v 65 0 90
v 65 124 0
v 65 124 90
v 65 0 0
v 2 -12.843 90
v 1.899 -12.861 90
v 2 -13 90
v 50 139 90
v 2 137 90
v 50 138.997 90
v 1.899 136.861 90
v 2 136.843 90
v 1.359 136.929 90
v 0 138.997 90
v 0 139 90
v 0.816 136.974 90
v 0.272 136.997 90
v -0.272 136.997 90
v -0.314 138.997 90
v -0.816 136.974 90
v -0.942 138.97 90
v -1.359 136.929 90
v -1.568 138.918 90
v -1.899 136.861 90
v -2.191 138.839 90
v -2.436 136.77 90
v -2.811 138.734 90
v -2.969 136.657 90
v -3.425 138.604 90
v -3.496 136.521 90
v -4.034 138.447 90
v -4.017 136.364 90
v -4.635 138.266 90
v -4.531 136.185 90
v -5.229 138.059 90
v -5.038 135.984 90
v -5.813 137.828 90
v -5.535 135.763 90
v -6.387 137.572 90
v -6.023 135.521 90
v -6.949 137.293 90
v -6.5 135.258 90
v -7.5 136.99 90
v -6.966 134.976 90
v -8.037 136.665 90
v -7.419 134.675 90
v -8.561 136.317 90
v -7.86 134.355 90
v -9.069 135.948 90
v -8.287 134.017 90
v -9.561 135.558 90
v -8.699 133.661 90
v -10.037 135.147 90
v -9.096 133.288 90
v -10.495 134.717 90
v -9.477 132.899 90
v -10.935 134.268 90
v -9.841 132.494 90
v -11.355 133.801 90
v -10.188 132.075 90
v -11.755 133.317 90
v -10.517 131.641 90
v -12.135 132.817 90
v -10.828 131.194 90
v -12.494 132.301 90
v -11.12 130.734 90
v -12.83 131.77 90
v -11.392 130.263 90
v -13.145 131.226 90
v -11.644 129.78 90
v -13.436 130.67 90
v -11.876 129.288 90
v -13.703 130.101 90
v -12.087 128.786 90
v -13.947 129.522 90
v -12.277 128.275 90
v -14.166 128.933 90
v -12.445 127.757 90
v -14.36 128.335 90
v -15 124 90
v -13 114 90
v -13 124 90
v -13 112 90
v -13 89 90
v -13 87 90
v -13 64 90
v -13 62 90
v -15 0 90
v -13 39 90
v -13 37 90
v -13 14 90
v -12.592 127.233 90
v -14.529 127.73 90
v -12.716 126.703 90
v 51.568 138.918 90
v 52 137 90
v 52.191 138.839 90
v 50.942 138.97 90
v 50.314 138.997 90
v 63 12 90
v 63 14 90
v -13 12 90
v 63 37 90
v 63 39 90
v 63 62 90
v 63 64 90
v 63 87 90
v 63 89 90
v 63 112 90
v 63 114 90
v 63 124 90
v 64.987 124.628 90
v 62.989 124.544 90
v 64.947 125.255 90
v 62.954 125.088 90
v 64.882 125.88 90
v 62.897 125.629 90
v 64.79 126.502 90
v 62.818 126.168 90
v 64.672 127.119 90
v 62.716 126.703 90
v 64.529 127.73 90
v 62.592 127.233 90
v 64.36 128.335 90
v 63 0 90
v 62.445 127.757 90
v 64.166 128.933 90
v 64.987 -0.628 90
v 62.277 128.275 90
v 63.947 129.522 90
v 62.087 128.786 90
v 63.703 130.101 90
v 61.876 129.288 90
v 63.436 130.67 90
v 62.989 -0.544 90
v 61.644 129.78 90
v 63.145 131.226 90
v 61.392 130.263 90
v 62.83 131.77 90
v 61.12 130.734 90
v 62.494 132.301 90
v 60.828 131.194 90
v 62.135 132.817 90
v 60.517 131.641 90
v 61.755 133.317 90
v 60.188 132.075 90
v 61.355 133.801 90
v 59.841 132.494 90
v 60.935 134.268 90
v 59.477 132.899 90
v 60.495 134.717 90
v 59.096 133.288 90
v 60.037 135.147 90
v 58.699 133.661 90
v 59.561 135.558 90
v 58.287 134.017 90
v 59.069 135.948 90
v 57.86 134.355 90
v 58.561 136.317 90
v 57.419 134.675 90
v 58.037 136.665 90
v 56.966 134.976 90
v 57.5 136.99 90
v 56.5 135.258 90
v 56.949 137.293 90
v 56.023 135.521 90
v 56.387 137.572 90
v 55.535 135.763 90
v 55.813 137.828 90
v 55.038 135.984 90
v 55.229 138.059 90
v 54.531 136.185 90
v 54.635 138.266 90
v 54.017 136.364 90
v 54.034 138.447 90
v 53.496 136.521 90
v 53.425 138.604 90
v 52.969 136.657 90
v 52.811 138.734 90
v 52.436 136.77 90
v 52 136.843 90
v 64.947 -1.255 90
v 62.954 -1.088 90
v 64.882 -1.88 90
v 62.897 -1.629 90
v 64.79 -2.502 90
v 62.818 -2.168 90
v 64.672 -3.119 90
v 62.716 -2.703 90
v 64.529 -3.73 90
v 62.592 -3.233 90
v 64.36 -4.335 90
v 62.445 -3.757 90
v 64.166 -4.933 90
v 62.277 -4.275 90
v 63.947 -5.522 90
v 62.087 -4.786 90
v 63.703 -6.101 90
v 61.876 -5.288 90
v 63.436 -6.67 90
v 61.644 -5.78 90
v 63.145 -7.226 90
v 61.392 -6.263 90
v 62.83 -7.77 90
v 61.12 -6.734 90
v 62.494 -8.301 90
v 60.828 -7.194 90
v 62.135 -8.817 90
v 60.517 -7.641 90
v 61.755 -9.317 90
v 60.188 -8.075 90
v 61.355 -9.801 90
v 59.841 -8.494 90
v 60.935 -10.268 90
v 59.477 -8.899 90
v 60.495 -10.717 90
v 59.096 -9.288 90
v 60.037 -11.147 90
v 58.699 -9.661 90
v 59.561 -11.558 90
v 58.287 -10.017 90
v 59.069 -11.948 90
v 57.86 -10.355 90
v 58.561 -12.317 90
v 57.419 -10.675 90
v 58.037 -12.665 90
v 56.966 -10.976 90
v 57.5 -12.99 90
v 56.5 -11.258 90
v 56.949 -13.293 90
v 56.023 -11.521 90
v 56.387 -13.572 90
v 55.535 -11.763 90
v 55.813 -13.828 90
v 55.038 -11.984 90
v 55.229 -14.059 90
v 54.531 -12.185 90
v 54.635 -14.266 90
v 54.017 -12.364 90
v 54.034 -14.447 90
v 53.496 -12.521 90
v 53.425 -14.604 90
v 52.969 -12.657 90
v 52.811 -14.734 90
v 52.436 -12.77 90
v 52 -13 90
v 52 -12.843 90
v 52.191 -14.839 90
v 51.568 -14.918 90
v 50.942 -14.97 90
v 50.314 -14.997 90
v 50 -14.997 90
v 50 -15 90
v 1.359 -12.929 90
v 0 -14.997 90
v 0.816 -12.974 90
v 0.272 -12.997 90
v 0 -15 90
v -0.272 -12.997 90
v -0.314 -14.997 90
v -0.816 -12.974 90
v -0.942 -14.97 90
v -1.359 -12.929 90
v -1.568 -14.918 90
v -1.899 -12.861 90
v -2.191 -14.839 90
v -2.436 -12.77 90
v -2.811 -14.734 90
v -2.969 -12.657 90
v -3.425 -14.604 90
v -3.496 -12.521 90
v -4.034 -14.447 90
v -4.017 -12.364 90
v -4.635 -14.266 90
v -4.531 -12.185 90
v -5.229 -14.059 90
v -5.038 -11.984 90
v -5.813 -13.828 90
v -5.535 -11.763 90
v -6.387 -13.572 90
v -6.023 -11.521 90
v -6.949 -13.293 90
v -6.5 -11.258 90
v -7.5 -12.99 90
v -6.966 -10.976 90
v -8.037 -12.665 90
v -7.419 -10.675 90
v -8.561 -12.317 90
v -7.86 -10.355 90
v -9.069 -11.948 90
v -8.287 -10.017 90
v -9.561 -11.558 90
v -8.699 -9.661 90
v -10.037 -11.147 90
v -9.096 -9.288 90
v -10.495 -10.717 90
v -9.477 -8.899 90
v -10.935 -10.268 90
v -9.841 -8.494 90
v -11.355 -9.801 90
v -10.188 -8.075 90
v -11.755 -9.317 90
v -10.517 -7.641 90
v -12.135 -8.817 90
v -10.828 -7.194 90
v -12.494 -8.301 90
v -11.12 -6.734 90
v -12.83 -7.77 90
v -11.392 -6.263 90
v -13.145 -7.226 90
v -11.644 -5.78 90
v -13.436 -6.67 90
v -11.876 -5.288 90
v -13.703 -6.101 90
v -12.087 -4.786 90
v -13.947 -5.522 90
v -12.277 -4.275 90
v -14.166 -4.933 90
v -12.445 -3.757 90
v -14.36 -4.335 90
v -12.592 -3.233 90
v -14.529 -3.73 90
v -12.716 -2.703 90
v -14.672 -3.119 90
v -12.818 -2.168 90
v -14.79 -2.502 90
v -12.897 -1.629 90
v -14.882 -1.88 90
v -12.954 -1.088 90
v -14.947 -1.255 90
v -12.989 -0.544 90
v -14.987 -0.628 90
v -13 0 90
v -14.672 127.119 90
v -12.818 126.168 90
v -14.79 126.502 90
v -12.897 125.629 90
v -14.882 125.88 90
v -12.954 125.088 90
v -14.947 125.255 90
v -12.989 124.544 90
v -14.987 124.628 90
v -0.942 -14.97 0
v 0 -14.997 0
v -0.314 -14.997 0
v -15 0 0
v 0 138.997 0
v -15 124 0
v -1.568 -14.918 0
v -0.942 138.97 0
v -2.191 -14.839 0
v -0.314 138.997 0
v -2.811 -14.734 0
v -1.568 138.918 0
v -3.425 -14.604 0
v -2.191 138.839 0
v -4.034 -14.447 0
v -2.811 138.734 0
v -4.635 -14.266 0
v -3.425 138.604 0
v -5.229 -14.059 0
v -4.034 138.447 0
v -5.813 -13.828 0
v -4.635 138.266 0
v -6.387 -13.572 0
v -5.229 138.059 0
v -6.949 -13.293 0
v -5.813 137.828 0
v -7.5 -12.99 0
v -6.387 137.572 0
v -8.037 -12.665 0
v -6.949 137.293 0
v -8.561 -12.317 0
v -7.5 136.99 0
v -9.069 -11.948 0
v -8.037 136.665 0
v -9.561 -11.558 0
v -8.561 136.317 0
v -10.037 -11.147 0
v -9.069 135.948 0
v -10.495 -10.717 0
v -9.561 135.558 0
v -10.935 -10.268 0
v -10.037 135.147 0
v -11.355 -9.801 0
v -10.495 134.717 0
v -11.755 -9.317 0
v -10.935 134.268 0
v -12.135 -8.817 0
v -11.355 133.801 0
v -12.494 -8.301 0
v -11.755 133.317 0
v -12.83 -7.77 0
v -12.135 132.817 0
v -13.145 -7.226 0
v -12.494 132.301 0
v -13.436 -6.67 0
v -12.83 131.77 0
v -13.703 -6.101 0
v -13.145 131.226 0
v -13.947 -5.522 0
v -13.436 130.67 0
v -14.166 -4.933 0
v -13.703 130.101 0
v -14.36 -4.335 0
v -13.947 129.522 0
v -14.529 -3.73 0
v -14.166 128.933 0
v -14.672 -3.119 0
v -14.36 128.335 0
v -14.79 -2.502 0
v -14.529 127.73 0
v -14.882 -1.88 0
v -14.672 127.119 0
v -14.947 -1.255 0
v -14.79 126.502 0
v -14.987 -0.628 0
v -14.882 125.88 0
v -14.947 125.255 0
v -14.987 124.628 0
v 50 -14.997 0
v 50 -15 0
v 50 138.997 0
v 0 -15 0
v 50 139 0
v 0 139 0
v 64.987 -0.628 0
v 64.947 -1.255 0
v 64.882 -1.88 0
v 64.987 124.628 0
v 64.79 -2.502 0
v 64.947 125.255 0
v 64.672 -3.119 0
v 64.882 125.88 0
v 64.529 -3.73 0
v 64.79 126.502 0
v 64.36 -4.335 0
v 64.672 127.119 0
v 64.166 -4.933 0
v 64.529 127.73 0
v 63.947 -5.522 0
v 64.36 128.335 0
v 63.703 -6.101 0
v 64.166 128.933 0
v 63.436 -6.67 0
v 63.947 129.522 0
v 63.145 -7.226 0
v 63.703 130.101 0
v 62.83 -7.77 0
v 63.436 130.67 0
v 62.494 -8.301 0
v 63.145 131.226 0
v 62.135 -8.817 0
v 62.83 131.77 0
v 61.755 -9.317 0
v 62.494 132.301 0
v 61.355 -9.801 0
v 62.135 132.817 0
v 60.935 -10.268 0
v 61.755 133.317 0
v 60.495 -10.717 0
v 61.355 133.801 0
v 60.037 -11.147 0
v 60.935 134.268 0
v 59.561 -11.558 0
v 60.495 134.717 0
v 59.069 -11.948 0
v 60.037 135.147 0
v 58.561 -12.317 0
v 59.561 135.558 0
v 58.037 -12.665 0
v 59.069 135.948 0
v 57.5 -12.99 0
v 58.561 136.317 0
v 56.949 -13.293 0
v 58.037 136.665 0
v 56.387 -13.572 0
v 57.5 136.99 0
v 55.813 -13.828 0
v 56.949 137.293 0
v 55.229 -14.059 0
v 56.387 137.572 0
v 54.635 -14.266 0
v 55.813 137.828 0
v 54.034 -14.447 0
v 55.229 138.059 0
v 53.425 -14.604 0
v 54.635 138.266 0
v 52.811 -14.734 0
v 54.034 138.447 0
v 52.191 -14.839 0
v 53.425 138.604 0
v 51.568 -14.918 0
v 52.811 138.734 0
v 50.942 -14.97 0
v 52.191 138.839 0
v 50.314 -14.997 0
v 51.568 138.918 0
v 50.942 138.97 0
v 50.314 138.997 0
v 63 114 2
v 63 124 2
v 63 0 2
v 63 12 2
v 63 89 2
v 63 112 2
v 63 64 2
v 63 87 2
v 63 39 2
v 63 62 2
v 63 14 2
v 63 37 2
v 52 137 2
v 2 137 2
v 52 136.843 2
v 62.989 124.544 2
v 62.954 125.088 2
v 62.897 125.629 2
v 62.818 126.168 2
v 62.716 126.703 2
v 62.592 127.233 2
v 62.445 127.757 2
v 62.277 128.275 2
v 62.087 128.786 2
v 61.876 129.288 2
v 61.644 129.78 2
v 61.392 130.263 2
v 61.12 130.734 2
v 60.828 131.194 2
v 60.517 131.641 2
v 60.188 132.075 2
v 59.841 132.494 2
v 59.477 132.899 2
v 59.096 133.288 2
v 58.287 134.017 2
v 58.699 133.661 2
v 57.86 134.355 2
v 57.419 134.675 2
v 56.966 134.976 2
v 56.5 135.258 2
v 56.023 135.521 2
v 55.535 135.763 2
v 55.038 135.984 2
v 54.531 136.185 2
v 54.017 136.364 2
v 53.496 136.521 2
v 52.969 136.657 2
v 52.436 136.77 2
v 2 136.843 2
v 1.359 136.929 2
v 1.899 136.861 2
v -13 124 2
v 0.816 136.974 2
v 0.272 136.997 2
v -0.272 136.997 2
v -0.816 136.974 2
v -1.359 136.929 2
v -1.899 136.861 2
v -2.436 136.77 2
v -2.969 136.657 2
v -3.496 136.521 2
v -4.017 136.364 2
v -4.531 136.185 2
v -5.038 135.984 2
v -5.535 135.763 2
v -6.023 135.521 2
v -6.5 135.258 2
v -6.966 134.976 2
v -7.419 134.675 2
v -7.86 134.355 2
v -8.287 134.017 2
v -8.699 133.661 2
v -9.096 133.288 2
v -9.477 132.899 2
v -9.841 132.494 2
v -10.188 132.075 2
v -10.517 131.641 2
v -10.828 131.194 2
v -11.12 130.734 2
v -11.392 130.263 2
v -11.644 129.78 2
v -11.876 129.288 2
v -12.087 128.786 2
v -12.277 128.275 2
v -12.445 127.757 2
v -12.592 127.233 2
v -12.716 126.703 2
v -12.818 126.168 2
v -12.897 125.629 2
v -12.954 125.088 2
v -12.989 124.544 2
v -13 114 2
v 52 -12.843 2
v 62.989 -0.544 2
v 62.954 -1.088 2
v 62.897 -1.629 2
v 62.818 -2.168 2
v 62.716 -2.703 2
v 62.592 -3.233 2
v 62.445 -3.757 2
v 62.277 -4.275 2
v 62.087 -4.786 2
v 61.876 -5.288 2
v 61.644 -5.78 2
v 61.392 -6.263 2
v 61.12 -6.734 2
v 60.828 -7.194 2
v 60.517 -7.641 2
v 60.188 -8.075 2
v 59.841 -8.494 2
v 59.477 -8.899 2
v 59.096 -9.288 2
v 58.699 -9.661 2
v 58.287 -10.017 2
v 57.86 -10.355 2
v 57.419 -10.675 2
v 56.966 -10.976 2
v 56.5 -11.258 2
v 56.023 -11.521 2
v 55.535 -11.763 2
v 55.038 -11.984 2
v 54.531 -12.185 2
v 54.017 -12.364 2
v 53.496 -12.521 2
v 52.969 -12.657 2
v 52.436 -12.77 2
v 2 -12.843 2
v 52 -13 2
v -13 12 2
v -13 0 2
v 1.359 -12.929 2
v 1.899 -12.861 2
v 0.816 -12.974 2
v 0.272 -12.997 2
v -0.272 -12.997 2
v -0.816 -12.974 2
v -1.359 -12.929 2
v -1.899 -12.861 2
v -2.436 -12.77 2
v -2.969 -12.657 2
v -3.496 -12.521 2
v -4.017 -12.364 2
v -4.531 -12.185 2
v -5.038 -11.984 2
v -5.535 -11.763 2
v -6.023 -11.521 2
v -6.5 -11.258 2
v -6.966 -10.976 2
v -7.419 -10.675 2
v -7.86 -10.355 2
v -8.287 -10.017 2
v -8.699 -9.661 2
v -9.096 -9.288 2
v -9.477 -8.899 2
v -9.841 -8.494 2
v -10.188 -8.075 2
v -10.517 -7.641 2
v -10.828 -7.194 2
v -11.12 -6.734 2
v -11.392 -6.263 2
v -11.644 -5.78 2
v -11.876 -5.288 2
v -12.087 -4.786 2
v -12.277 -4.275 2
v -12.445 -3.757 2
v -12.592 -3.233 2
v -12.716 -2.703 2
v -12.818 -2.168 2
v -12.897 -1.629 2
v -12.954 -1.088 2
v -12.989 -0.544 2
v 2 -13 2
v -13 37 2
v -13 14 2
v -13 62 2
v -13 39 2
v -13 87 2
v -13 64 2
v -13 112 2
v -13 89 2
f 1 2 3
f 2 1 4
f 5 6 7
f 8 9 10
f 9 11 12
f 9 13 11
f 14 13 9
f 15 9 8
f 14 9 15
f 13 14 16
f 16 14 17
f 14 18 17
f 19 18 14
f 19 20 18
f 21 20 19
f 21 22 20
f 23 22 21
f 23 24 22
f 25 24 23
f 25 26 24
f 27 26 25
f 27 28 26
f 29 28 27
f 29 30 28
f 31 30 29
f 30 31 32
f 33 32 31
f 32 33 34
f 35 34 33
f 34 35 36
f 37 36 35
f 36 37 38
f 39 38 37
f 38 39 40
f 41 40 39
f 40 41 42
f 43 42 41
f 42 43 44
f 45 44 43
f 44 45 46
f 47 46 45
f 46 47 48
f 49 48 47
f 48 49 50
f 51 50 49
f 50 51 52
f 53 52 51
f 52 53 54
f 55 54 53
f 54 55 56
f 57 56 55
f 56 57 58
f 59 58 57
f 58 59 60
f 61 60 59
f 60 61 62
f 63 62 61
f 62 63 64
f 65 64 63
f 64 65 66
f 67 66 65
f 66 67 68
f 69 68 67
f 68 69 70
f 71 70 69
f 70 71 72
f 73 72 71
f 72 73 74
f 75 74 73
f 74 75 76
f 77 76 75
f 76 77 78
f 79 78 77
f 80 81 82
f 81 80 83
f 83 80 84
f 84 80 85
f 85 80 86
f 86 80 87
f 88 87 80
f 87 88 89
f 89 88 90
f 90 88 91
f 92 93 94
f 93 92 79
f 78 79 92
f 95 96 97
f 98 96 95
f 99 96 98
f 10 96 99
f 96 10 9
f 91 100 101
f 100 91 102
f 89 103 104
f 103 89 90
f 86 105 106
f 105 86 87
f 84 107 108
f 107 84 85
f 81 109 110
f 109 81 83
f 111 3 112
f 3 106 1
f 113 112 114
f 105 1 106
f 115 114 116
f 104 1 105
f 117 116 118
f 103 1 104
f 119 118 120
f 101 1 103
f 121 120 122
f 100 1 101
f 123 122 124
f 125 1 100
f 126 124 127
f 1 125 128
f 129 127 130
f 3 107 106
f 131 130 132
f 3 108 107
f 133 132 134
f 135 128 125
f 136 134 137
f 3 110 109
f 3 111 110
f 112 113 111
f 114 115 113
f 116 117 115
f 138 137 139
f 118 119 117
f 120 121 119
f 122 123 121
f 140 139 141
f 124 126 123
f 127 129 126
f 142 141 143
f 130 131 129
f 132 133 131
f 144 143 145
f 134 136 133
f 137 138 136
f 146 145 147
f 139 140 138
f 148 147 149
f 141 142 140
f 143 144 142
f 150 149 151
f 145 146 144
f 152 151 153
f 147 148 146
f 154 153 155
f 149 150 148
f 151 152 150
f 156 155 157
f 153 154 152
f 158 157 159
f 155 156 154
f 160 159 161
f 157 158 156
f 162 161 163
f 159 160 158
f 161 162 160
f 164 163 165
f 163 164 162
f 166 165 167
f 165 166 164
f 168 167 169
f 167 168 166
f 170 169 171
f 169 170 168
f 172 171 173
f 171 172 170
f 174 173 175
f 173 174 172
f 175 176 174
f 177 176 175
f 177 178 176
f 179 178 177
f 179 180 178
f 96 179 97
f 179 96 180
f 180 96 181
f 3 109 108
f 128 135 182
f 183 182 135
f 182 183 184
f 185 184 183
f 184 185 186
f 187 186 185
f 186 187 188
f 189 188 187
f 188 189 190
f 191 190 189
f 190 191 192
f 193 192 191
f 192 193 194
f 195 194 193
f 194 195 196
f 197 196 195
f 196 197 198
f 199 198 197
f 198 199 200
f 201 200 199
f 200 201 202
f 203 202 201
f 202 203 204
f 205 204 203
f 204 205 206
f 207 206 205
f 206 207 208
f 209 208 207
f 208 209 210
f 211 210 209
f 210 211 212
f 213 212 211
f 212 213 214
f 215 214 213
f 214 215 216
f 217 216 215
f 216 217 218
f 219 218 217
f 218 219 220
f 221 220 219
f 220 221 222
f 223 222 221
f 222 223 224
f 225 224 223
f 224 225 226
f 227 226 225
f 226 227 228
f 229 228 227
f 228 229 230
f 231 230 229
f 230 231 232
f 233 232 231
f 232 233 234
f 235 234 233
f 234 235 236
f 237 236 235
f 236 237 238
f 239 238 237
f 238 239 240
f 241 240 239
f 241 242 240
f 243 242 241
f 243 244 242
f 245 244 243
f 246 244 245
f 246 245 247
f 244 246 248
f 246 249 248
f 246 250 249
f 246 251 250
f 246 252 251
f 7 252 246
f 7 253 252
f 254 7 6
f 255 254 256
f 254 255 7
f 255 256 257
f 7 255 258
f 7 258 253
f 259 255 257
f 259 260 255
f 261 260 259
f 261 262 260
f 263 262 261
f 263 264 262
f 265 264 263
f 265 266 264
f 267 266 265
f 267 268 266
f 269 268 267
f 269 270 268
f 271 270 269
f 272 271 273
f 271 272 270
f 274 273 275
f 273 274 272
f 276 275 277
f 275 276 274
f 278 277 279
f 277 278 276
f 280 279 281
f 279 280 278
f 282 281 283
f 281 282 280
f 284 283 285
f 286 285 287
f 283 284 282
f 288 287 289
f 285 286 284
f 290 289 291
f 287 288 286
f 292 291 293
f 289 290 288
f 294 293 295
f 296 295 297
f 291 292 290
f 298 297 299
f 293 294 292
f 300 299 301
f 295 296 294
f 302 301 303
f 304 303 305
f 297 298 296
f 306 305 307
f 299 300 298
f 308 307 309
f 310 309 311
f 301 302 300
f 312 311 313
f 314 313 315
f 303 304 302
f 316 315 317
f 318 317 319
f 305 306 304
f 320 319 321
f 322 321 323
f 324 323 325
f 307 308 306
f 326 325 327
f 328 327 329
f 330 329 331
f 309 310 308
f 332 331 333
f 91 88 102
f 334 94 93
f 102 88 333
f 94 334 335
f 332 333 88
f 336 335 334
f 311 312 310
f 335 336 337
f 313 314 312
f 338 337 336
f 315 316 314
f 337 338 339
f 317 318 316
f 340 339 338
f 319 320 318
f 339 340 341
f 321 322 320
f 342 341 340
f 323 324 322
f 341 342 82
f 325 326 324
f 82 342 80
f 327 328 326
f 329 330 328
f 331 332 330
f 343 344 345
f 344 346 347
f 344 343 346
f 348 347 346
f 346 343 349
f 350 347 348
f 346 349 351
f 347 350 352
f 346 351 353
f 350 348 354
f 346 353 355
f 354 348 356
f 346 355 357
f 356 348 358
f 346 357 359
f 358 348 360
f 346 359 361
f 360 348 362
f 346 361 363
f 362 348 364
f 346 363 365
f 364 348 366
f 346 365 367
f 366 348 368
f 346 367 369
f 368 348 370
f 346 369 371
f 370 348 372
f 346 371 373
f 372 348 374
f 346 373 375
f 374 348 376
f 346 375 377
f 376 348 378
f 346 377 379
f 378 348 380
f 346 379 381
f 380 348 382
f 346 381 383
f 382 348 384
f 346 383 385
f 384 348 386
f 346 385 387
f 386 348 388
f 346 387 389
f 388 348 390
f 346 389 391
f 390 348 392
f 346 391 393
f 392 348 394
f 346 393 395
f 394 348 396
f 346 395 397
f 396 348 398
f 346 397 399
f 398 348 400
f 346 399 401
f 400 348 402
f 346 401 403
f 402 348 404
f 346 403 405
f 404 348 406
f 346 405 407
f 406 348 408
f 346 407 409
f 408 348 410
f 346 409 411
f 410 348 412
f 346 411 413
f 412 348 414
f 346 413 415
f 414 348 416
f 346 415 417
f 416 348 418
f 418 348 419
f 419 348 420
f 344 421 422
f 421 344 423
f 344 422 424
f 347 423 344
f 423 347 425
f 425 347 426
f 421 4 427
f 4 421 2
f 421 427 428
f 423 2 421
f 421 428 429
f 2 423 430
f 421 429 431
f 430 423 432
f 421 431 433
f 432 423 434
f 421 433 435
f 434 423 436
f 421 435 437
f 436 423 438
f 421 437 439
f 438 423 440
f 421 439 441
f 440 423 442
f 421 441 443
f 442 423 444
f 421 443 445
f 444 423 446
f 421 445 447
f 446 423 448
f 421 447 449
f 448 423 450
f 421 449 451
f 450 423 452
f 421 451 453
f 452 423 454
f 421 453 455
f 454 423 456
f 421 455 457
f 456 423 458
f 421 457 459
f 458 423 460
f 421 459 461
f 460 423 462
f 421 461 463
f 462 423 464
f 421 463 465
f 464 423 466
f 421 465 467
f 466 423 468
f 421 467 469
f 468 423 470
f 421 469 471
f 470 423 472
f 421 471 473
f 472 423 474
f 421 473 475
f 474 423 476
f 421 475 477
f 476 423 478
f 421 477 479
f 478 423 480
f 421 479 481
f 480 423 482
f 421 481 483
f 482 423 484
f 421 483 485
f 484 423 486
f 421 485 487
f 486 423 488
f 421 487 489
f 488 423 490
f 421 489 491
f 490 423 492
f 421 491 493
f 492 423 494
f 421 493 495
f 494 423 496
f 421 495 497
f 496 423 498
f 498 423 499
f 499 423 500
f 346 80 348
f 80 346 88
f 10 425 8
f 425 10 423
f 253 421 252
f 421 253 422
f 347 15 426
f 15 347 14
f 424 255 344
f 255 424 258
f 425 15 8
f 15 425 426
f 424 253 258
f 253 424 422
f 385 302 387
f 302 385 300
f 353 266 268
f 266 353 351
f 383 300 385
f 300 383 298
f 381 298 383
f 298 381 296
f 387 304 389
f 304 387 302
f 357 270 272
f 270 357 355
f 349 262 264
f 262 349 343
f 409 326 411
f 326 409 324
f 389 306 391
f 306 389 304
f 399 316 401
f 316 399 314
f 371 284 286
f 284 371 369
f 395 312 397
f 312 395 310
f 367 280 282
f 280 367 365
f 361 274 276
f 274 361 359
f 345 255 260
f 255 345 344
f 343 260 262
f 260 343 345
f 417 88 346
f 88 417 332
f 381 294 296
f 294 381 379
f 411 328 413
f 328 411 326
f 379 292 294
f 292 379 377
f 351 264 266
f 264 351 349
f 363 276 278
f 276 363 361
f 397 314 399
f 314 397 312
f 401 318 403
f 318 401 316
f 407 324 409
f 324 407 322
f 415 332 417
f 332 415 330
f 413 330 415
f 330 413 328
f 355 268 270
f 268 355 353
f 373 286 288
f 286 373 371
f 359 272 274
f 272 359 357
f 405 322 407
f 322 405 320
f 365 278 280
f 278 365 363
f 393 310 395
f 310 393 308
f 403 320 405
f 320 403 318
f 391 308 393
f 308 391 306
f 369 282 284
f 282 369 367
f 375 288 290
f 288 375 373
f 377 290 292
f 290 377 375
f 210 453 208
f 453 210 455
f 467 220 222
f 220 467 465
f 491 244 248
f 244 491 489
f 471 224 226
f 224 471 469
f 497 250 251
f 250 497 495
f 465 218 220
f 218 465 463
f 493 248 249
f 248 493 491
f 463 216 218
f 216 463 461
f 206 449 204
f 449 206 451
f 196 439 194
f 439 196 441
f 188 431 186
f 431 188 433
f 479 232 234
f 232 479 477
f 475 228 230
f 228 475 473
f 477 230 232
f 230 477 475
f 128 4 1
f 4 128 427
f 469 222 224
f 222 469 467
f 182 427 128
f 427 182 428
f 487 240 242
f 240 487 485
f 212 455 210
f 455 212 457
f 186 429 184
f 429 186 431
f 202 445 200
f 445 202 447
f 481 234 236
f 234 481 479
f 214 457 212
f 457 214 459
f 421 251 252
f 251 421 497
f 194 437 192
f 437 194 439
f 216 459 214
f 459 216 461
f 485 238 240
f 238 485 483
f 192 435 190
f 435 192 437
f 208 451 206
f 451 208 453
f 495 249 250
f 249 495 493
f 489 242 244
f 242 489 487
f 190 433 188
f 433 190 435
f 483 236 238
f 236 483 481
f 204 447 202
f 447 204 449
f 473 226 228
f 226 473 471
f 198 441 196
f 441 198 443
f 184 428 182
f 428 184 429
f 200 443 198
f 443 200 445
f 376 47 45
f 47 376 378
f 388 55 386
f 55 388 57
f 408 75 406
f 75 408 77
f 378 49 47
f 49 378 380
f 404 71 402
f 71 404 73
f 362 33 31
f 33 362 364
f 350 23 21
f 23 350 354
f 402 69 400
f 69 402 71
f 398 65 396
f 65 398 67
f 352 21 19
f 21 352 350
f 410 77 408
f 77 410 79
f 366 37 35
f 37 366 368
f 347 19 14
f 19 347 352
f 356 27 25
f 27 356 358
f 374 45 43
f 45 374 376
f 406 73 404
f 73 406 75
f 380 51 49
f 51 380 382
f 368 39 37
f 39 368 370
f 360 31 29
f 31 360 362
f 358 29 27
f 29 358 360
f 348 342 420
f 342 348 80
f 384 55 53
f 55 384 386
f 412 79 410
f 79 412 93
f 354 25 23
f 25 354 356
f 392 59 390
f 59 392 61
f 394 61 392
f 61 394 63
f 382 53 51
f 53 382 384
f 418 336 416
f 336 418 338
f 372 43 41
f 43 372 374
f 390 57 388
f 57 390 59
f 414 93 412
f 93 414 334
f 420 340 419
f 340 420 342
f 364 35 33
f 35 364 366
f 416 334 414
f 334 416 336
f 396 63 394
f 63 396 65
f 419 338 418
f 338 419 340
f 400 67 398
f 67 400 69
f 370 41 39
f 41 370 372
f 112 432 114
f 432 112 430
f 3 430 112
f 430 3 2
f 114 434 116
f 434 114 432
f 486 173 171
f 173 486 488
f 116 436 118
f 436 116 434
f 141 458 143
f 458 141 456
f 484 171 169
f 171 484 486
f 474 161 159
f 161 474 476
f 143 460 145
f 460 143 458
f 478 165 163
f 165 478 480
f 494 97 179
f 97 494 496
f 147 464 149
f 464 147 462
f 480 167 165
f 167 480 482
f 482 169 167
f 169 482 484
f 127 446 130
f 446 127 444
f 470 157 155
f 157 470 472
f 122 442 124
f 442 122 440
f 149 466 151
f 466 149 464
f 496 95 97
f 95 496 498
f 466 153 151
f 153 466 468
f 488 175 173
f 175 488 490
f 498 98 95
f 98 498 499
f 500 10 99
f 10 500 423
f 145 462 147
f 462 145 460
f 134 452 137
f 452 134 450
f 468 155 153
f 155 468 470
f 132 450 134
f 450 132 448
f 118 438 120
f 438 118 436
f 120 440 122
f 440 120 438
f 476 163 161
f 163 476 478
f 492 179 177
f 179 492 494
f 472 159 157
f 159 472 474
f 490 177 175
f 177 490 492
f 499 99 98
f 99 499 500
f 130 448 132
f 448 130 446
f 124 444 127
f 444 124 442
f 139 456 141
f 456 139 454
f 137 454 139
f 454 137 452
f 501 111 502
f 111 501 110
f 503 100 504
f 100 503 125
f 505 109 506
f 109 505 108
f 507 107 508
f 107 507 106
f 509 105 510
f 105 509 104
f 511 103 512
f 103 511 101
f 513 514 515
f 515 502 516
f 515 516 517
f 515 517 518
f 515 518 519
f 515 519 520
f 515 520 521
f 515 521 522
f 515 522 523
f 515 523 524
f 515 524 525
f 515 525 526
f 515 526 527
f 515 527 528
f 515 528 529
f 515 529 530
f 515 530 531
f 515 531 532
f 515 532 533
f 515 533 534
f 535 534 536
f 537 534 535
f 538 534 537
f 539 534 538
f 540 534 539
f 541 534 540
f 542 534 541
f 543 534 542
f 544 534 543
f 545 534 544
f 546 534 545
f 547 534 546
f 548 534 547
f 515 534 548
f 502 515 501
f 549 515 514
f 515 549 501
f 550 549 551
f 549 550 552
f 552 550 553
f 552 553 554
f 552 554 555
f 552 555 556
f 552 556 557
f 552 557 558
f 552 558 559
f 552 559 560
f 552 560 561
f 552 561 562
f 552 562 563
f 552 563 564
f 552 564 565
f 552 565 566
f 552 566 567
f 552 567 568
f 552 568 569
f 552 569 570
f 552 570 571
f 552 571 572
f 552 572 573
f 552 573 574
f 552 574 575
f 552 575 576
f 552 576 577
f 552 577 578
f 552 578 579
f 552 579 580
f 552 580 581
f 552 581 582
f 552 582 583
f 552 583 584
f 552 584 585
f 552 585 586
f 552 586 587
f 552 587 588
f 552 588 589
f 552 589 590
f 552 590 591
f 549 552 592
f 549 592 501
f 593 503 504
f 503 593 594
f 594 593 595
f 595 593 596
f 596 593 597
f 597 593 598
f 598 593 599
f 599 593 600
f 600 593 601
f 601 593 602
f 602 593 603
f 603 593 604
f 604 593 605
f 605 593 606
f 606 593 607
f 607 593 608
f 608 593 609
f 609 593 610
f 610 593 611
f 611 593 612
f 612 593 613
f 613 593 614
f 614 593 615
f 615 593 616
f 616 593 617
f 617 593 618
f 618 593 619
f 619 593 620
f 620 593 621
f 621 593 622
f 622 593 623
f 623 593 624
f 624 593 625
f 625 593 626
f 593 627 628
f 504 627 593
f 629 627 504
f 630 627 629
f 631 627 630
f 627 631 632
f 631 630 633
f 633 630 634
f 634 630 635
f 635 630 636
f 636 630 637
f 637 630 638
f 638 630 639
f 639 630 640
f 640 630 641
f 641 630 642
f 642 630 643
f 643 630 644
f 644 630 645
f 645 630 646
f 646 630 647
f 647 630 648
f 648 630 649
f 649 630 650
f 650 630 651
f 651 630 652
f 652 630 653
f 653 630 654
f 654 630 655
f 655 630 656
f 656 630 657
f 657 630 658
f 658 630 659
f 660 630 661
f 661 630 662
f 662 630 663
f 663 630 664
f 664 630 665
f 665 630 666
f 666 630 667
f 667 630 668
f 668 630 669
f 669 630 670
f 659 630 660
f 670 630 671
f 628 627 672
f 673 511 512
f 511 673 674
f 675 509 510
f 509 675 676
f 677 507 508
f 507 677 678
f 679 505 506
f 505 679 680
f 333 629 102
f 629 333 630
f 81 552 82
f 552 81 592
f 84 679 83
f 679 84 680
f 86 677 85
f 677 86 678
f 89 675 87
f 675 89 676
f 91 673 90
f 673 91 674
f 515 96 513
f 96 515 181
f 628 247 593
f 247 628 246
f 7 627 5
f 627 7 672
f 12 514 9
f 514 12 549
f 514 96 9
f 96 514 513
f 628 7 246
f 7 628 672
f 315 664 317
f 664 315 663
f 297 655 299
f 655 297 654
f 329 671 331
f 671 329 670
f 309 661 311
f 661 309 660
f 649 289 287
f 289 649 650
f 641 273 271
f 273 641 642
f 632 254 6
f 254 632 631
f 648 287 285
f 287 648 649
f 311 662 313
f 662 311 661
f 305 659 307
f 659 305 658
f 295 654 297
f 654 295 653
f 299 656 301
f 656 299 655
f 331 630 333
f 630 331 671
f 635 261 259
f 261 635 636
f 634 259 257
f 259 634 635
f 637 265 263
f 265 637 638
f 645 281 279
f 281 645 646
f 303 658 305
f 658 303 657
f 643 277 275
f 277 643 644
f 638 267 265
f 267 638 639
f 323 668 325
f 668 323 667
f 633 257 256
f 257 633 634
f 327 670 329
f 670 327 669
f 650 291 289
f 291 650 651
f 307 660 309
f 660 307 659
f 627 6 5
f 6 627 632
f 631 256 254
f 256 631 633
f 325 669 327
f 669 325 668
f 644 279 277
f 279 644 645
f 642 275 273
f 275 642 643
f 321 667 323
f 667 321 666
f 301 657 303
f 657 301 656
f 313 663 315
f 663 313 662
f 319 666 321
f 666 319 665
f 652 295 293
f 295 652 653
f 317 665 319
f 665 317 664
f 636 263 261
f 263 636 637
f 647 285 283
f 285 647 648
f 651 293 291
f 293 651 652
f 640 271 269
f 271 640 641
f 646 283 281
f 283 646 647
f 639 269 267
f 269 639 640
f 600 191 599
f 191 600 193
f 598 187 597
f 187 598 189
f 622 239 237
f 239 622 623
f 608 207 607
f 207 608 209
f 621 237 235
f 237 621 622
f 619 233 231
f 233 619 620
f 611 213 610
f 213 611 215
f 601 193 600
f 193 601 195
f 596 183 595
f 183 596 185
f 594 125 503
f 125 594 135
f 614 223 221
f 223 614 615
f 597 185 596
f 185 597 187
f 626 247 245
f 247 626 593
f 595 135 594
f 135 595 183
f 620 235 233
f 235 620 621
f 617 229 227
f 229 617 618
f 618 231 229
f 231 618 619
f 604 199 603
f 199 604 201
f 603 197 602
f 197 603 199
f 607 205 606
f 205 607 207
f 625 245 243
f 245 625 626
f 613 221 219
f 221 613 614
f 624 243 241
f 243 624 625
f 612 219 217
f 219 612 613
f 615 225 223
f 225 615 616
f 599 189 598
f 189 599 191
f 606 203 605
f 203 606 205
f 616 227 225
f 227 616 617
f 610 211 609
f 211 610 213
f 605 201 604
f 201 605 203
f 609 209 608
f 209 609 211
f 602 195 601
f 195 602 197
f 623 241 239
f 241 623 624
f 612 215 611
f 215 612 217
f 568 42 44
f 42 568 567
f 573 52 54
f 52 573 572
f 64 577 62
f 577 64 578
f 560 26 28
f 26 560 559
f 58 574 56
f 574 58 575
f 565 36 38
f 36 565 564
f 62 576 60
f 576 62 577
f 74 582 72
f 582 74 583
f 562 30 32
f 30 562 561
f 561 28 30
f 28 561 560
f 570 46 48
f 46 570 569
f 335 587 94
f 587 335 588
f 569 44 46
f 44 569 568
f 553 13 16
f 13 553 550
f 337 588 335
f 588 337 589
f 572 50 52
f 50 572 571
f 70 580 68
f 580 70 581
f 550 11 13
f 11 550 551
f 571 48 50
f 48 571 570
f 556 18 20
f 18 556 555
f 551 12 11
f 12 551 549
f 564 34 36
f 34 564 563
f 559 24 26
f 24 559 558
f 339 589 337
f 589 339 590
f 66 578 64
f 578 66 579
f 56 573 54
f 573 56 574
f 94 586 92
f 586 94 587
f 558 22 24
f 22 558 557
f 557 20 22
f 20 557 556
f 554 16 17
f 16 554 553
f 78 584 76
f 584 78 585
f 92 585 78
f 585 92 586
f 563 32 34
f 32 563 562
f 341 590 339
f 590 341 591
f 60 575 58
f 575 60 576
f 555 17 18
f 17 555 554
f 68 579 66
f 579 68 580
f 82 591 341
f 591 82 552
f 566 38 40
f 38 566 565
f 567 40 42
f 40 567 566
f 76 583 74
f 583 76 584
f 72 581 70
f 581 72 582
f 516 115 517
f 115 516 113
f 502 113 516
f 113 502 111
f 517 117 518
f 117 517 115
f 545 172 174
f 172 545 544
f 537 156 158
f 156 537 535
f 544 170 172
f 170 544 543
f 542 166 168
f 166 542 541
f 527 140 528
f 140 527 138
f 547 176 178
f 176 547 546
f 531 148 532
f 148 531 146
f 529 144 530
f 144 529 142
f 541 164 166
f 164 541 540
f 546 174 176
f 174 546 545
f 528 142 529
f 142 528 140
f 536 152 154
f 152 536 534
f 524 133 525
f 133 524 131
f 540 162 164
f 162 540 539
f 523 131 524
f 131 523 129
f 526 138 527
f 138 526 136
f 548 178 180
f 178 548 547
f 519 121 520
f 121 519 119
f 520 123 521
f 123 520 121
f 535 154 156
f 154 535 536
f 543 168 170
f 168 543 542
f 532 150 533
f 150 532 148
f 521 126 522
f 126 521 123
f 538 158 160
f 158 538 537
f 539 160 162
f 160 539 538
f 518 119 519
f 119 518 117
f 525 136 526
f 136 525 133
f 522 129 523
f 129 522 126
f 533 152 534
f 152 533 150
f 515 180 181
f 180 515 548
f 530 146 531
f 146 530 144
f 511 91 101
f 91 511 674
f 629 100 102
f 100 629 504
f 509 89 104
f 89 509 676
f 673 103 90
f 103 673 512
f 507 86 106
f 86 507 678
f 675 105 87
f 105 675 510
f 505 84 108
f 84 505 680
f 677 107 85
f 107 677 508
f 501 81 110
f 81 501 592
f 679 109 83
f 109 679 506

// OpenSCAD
$fn=150;

hoch=90;

difference()
{
union(){
translate([-15,0,0])
    cube([80,124,hoch]);
translate([0,-15,0])
    cube([50,154,hoch]);
cylinder(r=15,h=hoch);
translate([50,0,0])
    cylinder(r=15,h=hoch);
translate([0,124,0])
    cylinder(r=15,h=hoch);
translate([50,124,0])
    cylinder(r=15,h=hoch);
}
union(){
translate([-13,0,2])
    cube([76,124,hoch]);
translate([2,-13,2])
    cube([50,150,hoch]);
translate([0,0,2])
    cylinder(r=13,h=hoch);
translate([50,0,2])
    cylinder(r=13,h=hoch);
translate([0,124,2])
    cylinder(r=13,h=hoch);
translate([50,124,2])
    cylinder(r=13,h=hoch);
}
}
for(pos = [12 : 25 : 130])
{
    translate([-15,pos,0])
        cube([80,2 ,hoch]);
}
